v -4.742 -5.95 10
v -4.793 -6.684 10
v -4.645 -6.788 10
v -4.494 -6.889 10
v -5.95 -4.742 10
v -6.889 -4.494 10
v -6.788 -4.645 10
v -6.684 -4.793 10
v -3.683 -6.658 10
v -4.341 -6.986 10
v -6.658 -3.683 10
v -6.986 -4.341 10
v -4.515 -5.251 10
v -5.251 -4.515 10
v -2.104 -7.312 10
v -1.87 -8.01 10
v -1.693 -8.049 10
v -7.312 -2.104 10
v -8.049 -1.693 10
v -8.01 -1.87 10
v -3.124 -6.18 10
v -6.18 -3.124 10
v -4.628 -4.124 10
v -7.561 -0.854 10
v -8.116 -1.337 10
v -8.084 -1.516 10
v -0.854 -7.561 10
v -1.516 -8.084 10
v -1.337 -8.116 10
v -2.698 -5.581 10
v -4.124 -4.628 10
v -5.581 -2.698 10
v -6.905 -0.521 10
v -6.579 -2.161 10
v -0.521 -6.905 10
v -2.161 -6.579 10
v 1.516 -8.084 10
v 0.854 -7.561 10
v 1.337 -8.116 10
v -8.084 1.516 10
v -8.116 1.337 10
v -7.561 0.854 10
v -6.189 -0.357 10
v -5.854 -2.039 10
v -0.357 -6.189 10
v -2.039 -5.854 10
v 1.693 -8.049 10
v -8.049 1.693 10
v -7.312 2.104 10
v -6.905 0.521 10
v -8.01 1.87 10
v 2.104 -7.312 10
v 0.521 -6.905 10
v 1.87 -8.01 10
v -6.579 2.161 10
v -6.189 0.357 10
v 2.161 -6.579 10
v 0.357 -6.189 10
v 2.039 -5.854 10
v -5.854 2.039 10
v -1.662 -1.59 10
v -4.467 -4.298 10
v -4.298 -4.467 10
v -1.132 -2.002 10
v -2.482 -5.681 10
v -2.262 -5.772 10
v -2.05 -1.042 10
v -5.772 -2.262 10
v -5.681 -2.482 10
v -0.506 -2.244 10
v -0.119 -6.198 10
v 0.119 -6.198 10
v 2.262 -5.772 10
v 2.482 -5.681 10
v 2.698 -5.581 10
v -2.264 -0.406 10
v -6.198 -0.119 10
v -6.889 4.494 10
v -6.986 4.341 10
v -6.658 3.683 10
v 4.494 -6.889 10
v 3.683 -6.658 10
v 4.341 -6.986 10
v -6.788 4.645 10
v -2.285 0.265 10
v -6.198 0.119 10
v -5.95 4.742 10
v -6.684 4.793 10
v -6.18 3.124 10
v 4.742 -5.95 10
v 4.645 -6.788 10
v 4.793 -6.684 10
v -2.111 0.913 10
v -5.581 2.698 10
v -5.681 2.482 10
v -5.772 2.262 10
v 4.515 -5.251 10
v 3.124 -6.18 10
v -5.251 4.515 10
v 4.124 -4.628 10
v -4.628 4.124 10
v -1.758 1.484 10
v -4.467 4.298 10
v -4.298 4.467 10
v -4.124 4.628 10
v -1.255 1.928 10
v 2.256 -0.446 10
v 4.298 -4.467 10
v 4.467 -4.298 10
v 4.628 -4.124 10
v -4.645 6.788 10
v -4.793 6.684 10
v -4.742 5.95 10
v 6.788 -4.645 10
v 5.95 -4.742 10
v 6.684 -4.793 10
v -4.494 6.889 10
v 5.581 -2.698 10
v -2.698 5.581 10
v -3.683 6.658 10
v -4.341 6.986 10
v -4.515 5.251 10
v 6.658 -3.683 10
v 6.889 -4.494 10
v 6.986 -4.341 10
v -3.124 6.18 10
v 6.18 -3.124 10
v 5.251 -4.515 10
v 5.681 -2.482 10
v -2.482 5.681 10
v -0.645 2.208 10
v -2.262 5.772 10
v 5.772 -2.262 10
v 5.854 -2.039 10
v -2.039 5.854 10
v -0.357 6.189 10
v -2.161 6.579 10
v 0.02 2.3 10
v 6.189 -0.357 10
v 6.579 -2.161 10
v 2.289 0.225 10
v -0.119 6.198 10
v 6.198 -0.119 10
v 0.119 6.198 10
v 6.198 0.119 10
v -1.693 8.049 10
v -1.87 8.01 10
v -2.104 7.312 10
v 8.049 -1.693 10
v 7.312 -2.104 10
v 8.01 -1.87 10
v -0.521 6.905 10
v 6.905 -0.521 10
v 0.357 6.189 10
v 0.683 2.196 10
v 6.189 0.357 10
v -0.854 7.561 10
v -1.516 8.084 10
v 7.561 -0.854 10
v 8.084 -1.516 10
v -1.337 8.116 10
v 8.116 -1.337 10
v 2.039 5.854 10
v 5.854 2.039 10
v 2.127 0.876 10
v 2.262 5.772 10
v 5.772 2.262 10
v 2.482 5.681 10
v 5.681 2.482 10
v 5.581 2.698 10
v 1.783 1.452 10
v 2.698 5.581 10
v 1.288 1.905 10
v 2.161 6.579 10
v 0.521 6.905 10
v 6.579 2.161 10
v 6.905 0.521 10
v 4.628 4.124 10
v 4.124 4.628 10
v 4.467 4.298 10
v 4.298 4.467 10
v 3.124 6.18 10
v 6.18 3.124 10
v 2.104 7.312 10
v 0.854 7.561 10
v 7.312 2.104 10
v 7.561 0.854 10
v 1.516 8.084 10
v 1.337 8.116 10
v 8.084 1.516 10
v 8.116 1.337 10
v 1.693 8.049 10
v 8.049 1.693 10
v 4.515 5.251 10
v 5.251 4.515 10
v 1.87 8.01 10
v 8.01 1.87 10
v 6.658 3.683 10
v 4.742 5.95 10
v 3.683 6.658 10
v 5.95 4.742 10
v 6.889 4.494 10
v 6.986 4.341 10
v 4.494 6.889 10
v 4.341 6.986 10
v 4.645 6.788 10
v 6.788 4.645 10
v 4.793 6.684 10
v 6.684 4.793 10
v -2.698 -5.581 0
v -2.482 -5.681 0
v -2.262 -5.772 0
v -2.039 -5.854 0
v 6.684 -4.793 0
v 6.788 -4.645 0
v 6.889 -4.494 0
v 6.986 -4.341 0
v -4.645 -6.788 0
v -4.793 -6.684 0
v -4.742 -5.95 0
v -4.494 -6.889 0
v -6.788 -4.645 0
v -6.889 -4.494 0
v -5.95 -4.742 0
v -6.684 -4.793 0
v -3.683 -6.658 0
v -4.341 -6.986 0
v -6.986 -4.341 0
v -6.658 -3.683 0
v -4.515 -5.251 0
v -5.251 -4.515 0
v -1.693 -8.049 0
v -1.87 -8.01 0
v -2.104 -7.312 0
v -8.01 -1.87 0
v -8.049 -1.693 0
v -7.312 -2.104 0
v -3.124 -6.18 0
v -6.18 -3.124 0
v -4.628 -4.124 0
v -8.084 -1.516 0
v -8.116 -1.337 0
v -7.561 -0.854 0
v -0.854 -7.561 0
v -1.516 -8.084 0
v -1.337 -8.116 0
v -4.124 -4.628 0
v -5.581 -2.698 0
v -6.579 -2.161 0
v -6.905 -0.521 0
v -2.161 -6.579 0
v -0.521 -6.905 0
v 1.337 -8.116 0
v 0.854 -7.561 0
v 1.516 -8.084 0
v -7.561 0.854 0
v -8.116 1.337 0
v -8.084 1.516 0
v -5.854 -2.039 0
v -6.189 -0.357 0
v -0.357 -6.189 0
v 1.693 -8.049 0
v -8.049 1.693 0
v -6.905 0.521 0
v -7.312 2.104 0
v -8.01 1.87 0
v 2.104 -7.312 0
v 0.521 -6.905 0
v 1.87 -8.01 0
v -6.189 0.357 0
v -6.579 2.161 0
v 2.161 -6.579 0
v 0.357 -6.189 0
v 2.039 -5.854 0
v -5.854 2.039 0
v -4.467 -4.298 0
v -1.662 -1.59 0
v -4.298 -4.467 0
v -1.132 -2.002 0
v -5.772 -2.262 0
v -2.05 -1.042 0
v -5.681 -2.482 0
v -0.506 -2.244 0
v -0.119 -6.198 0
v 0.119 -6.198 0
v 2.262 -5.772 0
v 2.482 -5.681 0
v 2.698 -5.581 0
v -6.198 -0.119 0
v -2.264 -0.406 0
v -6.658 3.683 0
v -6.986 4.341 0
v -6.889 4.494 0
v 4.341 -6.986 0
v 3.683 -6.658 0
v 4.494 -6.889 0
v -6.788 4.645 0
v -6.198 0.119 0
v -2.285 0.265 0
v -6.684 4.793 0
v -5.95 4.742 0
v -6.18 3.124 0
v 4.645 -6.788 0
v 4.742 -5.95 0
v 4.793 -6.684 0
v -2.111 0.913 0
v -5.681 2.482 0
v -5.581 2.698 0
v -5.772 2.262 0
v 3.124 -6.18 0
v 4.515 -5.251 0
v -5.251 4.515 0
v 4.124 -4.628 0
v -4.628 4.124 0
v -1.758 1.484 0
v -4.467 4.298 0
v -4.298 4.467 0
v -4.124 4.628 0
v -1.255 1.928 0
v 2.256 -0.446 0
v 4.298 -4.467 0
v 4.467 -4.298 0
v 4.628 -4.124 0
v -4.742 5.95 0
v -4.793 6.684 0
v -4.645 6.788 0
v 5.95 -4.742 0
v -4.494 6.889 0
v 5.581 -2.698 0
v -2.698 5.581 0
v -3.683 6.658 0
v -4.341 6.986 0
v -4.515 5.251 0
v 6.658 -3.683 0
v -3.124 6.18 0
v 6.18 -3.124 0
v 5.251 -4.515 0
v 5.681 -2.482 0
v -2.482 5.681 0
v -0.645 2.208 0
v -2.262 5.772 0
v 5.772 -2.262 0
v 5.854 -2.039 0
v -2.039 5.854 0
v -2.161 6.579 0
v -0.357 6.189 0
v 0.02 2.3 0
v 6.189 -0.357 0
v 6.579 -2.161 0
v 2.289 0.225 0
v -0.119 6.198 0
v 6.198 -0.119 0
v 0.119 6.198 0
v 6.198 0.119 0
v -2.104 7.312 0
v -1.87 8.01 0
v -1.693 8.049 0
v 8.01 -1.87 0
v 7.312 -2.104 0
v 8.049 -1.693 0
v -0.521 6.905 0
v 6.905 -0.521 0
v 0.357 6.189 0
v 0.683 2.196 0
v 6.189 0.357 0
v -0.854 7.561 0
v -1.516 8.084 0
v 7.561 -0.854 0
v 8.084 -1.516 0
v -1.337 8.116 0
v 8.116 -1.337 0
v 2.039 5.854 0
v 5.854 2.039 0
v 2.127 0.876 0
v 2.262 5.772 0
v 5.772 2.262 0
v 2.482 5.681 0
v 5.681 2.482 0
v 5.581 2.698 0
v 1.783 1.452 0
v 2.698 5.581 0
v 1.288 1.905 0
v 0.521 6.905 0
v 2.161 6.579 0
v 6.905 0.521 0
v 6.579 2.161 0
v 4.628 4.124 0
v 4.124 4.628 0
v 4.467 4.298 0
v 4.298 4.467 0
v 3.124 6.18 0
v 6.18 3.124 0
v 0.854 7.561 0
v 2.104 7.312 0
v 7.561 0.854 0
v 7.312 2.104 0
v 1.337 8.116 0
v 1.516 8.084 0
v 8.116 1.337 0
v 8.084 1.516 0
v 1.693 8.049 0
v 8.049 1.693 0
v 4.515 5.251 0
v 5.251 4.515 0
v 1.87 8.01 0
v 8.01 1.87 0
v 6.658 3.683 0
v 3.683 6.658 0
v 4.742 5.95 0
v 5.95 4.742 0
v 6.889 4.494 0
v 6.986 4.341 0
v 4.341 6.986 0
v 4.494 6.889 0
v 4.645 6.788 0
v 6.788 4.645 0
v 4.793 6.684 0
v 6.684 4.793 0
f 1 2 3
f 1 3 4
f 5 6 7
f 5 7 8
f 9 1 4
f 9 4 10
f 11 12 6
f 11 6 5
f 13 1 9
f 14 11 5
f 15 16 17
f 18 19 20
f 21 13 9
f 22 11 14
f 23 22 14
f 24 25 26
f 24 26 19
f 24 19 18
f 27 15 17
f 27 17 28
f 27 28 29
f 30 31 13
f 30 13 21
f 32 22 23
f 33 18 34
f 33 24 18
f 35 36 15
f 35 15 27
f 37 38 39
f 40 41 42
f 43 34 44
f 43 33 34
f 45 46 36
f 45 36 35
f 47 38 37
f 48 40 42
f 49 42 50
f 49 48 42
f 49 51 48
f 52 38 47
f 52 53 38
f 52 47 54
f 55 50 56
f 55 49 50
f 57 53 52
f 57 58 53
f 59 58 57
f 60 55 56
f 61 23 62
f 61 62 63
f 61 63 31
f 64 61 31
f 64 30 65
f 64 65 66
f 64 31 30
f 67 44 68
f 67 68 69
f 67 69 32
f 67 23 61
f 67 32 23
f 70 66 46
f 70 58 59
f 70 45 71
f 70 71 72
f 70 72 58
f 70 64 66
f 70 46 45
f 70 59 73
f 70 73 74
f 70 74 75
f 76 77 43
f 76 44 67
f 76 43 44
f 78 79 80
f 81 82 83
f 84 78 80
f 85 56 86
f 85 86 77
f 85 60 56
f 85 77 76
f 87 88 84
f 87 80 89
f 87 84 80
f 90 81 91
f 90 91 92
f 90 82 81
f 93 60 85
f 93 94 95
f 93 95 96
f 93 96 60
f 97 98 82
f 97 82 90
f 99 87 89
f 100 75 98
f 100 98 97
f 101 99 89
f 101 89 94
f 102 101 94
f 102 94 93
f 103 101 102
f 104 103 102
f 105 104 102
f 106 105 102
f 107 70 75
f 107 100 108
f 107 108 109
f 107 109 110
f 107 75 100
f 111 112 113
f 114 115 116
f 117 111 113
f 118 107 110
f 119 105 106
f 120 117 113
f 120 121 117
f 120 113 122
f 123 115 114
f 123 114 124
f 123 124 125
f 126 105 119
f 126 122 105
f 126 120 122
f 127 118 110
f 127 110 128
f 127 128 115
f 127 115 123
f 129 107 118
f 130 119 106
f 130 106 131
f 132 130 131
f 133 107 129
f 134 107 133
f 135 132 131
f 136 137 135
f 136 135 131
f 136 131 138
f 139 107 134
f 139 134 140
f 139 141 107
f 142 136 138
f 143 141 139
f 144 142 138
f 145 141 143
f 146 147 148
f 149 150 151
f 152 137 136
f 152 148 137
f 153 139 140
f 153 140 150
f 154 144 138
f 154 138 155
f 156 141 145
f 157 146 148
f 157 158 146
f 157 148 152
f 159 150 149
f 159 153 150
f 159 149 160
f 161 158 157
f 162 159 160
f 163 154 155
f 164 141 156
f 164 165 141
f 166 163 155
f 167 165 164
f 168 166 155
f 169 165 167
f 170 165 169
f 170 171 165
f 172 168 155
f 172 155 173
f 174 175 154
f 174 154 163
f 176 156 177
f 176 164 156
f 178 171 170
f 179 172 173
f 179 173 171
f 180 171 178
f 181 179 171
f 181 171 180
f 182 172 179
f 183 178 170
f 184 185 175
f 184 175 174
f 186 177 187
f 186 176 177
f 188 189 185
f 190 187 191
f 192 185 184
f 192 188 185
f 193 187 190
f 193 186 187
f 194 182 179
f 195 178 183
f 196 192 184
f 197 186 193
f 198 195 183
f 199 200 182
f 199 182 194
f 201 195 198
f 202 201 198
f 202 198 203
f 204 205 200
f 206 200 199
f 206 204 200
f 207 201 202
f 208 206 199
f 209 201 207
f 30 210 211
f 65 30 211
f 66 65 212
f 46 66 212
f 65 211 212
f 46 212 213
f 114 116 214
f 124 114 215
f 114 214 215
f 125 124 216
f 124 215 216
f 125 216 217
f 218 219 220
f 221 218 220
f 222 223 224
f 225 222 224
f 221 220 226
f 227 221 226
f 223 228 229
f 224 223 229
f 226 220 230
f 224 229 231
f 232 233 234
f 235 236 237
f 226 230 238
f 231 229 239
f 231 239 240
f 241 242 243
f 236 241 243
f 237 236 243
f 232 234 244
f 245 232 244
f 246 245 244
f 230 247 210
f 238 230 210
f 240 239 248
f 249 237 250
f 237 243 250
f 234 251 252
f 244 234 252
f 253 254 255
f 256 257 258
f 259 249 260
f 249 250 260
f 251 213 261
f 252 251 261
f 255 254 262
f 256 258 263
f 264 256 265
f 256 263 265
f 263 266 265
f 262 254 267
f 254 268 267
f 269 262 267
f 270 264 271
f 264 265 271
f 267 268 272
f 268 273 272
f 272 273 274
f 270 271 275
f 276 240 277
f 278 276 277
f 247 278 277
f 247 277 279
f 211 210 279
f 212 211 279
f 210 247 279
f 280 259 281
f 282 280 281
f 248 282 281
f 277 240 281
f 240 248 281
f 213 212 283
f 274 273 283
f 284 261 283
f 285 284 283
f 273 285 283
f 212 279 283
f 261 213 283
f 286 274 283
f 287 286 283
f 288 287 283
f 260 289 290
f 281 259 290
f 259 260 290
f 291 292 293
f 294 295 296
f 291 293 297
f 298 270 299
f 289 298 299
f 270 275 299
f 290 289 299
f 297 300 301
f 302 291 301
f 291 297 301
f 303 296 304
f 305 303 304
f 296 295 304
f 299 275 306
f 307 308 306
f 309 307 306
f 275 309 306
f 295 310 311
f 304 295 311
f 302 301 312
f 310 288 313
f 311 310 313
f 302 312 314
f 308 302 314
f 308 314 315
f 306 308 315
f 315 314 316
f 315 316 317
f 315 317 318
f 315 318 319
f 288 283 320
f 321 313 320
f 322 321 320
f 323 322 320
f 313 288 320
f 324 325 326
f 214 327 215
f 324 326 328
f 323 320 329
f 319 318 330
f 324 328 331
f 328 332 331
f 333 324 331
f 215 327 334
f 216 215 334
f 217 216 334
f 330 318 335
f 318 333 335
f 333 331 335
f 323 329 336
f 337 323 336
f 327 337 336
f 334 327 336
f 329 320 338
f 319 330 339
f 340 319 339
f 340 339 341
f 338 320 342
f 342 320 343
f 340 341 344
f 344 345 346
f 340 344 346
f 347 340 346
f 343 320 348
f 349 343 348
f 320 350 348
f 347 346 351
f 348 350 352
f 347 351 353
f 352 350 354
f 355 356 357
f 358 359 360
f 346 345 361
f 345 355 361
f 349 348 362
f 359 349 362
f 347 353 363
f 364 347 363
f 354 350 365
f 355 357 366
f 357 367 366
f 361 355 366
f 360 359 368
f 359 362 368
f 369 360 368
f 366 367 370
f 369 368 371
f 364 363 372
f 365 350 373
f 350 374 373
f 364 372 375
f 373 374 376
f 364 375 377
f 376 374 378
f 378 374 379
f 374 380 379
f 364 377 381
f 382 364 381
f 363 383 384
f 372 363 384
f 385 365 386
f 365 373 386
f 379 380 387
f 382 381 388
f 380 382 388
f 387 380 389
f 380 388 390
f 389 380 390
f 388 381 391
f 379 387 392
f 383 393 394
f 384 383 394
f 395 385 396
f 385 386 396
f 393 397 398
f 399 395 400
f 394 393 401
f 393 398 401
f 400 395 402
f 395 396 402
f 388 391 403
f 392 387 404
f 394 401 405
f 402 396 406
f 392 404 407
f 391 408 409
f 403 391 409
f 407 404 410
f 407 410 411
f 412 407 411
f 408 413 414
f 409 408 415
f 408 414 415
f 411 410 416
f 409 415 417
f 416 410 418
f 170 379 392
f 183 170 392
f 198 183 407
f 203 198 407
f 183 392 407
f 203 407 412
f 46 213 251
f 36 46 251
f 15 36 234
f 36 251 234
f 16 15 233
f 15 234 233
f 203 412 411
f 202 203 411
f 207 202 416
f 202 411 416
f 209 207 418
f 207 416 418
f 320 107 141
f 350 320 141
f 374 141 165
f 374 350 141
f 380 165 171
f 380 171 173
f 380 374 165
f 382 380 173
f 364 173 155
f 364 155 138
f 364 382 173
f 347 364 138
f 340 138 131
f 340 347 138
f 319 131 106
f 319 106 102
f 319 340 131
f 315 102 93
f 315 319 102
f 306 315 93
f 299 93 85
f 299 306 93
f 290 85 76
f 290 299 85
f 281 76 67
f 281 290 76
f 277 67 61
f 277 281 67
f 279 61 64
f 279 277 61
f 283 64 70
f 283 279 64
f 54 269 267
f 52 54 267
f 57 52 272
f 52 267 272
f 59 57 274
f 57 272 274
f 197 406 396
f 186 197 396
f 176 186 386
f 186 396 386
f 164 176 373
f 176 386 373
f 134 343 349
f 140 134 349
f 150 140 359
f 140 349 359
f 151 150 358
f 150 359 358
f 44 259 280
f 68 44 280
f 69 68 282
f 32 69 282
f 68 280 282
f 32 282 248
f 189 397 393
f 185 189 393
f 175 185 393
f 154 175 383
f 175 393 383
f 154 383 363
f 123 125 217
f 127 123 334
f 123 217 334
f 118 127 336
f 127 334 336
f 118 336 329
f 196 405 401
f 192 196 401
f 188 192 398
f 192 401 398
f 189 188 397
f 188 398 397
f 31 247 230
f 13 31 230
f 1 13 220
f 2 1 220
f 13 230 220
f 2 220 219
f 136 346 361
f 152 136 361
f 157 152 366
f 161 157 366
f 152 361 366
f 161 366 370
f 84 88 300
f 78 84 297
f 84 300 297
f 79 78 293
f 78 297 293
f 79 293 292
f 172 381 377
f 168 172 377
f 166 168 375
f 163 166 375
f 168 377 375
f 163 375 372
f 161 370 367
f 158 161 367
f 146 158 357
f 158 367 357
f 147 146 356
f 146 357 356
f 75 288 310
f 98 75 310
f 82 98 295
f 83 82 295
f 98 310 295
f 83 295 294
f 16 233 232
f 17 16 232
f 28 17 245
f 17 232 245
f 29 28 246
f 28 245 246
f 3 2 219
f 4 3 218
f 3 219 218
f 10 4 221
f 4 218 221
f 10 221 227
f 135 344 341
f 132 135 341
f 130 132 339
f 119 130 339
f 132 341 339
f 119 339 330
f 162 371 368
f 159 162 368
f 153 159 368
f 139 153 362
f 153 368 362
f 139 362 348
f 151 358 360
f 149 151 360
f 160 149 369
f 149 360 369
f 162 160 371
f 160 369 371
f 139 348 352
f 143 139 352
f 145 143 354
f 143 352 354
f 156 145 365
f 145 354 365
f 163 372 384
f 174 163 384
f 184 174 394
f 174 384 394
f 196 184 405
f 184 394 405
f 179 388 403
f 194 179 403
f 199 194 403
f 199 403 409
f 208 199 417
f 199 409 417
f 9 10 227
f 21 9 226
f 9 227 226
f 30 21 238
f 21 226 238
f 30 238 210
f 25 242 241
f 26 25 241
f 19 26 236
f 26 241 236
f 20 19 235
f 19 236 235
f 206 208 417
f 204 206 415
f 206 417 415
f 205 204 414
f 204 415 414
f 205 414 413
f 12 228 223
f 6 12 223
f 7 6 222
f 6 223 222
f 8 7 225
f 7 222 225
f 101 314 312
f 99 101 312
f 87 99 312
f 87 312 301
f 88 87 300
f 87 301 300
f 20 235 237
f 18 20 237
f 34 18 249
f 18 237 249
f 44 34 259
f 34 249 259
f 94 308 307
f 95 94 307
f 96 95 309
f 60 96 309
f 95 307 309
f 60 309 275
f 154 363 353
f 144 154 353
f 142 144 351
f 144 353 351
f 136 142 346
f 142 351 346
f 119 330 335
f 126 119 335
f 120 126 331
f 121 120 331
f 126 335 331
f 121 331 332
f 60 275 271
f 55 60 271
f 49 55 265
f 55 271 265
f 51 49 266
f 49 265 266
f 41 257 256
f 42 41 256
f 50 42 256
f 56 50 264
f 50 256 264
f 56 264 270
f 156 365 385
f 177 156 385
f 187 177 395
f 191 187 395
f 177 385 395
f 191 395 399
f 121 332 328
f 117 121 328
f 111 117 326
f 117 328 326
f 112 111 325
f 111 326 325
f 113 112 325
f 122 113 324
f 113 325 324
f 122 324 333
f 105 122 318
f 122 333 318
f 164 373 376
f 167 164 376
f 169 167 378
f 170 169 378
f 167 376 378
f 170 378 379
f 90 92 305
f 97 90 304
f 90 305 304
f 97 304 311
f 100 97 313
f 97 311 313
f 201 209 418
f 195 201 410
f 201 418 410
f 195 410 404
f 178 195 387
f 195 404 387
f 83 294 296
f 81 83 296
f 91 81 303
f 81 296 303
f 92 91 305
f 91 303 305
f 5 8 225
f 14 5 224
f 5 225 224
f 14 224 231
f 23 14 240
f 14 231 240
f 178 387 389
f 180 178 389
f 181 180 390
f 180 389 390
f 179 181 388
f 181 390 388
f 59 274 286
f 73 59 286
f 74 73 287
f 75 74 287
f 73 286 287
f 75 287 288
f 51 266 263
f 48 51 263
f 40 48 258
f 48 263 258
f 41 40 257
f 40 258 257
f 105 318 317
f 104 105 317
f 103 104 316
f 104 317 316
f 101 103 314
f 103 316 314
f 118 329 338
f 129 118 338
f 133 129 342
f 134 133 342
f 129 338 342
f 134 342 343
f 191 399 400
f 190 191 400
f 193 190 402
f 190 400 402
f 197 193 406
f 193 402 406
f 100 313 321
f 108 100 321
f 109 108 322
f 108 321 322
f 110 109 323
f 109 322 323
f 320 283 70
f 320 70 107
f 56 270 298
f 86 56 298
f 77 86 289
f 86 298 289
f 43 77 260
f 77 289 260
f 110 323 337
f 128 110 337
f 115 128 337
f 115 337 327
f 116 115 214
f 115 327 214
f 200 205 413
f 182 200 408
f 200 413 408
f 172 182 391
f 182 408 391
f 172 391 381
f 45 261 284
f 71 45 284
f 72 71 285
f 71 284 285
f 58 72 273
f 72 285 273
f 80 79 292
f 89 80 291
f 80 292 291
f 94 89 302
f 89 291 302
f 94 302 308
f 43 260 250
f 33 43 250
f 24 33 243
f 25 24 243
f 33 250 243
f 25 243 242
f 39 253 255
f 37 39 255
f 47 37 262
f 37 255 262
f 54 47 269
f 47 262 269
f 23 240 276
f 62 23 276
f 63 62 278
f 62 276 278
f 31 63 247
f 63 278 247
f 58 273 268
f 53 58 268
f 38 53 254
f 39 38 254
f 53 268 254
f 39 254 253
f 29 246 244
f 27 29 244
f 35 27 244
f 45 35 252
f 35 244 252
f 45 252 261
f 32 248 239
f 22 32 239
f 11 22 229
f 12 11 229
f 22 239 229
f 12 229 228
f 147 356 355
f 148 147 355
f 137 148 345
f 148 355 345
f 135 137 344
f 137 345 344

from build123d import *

# Parameters (mm, degrees)
BOSS_EXTRUDE1_DEPTH = 10


with BuildPart() as part:
    # Model → Boss-Extrude1 (new body)
    with BuildSketch(Plane.XY):
        with BuildLine():
            ThreePointArc((-8.115592249, 1.337081693), (-7.243390826, 0.66756543), (-6.188733379, 0.356623286))
            ThreePointArc((-6.188733379, 0.356623286), (-6.199, 0), (-6.188733379, -0.356623286))
            ThreePointArc((-6.188733379, -0.356623286), (-7.243390826, -0.66756543), (-8.115592249, -1.337081693))
            ThreePointArc((-8.115592249, -1.337081693), (-8.066958931, -1.604617899), (-8.009508584, -1.870400288))
            ThreePointArc((-8.009508584, -1.870400288), (-6.94748676, -2.155175626), (-5.854117924, -2.038848777))
            ThreePointArc((-5.854117924, -2.038848777), (-5.727129222, -2.372254597), (-5.581170278, -2.697802686))
            ThreePointArc((-5.581170278, -2.697802686), (-6.4365543, -3.388675701), (-6.986150561, -4.341005107))
            ThreePointArc((-6.986150561, -4.341005107), (-6.838837561, -4.569565167), (-6.684049844, -4.793130781))
            ThreePointArc((-6.684049844, -4.793130781), (-5.593890814, -4.649810729), (-4.628266083, -4.123924595))
            ThreePointArc((-4.628266083, -4.123924595), (-4.383354937, -4.383354937), (-4.123924596, -4.628266083))
            ThreePointArc((-4.123924596, -4.628266083), (-4.649810729, -5.593890814), (-4.793130781, -6.684049844))
            ThreePointArc((-4.793130781, -6.684049844), (-4.569565167, -6.838837561), (-4.341005107, -6.986150561))
            ThreePointArc((-4.341005107, -6.986150561), (-3.388675701, -6.4365543), (-2.697802686, -5.581170278))
            ThreePointArc((-2.697802686, -5.581170278), (-2.372254597, -5.727129222), (-2.038848777, -5.854117924))
            ThreePointArc((-2.038848777, -5.854117924), (-2.155175626, -6.94748676), (-1.870400288, -8.009508584))
            ThreePointArc((-1.870400288, -8.009508584), (-1.604617899, -8.066958931), (-1.337081693, -8.115592249))
            ThreePointArc((-1.337081693, -8.115592249), (-0.66756543, -7.243390826), (-0.356623286, -6.188733379))
            ThreePointArc((-0.356623286, -6.188733379), (0, -6.199), (0.356623286, -6.188733379))
            ThreePointArc((0.356623286, -6.188733379), (0.66756543, -7.243390826), (1.337081693, -8.115592249))
            ThreePointArc((1.337081693, -8.115592249), (1.604617899, -8.066958931), (1.870400288, -8.009508584))
            ThreePointArc((1.870400288, -8.009508584), (2.155175626, -6.94748676), (2.038848777, -5.854117924))
            ThreePointArc((2.038848777, -5.854117924), (2.372254597, -5.727129222), (2.697802686, -5.581170278))
            ThreePointArc((2.697802686, -5.581170278), (3.388675701, -6.4365543), (4.341005107, -6.986150561))
            ThreePointArc((4.341005107, -6.986150561), (4.569565167, -6.838837561), (4.793130781, -6.684049844))
            ThreePointArc((4.793130781, -6.684049844), (4.649810729, -5.593890814), (4.123924595, -4.628266083))
            ThreePointArc((4.123924595, -4.628266083), (4.383354937, -4.383354937), (4.628266083, -4.123924595))
            ThreePointArc((4.628266083, -4.123924595), (5.593890814, -4.649810729), (6.684049844, -4.79313078))
            ThreePointArc((6.684049844, -4.79313078), (6.838837561, -4.569565167), (6.986150561, -4.341005107))
            ThreePointArc((6.986150561, -4.341005107), (6.4365543, -3.388675701), (5.581170278, -2.697802686))
            ThreePointArc((5.581170278, -2.697802686), (5.727129222, -2.372254597), (5.854117924, -2.038848777))
            ThreePointArc((5.854117924, -2.038848777), (6.94748676, -2.155175626), (8.009508584, -1.870400288))
            ThreePointArc((8.009508584, -1.870400288), (8.066958931, -1.604617899), (8.115592249, -1.337081693))
            ThreePointArc((8.115592249, -1.337081693), (7.243390826, -0.66756543), (6.188733379, -0.356623286))
            ThreePointArc((6.188733379, -0.356623286), (6.199, 0), (6.188733379, 0.356623286))
            ThreePointArc((6.188733379, 0.356623286), (7.243390826, 0.66756543), (8.115592249, 1.337081693))
            ThreePointArc((8.115592249, 1.337081693), (8.066958931, 1.604617899), (8.009508584, 1.870400288))
            ThreePointArc((8.009508584, 1.870400288), (6.94748676, 2.155175626), (5.854117924, 2.038848777))
            ThreePointArc((5.854117924, 2.038848777), (5.727129222, 2.372254597), (5.581170278, 2.697802686))
            ThreePointArc((5.581170278, 2.697802686), (6.4365543, 3.388675701), (6.986150561, 4.341005107))
            ThreePointArc((6.986150561, 4.341005107), (6.838837561, 4.569565167), (6.684049844, 4.793130781))
            ThreePointArc((6.684049844, 4.793130781), (5.593890814, 4.649810729), (4.628266083, 4.123924595))
            ThreePointArc((4.628266083, 4.123924595), (4.383354937, 4.383354937), (4.123924595, 4.628266083))
            ThreePointArc((4.123924595, 4.628266083), (4.649810729, 5.593890814), (4.79313078, 6.684049844))
            ThreePointArc((4.79313078, 6.684049844), (4.569565167, 6.838837561), (4.341005107, 6.986150561))
            ThreePointArc((4.341005107, 6.986150561), (3.388675701, 6.4365543), (2.697802686, 5.581170278))
            ThreePointArc((2.697802686, 5.581170278), (2.372254597, 5.727129222), (2.038848777, 5.854117924))
            ThreePointArc((2.038848777, 5.854117924), (2.155175626, 6.94748676), (1.870400288, 8.009508584))
            ThreePointArc((1.870400288, 8.009508584), (1.604617899, 8.066958931), (1.337081693, 8.115592249))
            ThreePointArc((1.337081693, 8.115592249), (0.66756543, 7.243390826), (0.356623286, 6.188733379))
            ThreePointArc((0.356623286, 6.188733379), (0, 6.199), (-0.356623286, 6.188733379))
            ThreePointArc((-0.356623286, 6.188733379), (-0.66756543, 7.243390826), (-1.337081693, 8.115592249))
            ThreePointArc((-1.337081693, 8.115592249), (-1.604617899, 8.066958931), (-1.870400288, 8.009508584))
            ThreePointArc((-1.870400288, 8.009508584), (-2.155175626, 6.94748676), (-2.038848777, 5.854117924))
            ThreePointArc((-2.038848777, 5.854117924), (-2.372254597, 5.727129222), (-2.697802686, 5.581170278))
            ThreePointArc((-2.697802686, 5.581170278), (-3.388675701, 6.4365543), (-4.341005107, 6.986150561))
            ThreePointArc((-4.341005107, 6.986150561), (-4.569565167, 6.838837561), (-4.793130781, 6.684049844))
            ThreePointArc((-4.793130781, 6.684049844), (-4.649810729, 5.593890814), (-4.123924595, 4.628266083))
            ThreePointArc((-4.123924595, 4.628266083), (-4.383354937, 4.383354937), (-4.628266083, 4.123924595))
            ThreePointArc((-4.628266083, 4.123924595), (-5.593890814, 4.649810729), (-6.684049844, 4.79313078))
            ThreePointArc((-6.684049844, 4.79313078), (-6.838837561, 4.569565167), (-6.986150561, 4.341005107))
            ThreePointArc((-6.986150561, 4.341005107), (-6.4365543, 3.388675701), (-5.581170278, 2.697802686))
            ThreePointArc((-5.581170278, 2.697802686), (-5.727129222, 2.372254597), (-5.854117924, 2.038848777))
            ThreePointArc((-5.854117924, 2.038848777), (-6.94748676, 2.155175626), (-8.009508584, 1.870400288))
            ThreePointArc((-8.009508584, 1.870400288), (-8.066958931, 1.604617899), (-8.115592249, 1.337081693))
        make_face()
        with BuildLine():
            Line((-0.506237517, -2.243596126), (2.256391081, -0.445756983))
            ThreePointArc((2.256391081, -0.445756983), (-1.254518143, 1.927740706), (-0.506237517, -2.243596126))
        make_face(mode=Mode.SUBTRACT)
    extrude(amount=BOSS_EXTRUDE1_DEPTH)


solid = part.part
